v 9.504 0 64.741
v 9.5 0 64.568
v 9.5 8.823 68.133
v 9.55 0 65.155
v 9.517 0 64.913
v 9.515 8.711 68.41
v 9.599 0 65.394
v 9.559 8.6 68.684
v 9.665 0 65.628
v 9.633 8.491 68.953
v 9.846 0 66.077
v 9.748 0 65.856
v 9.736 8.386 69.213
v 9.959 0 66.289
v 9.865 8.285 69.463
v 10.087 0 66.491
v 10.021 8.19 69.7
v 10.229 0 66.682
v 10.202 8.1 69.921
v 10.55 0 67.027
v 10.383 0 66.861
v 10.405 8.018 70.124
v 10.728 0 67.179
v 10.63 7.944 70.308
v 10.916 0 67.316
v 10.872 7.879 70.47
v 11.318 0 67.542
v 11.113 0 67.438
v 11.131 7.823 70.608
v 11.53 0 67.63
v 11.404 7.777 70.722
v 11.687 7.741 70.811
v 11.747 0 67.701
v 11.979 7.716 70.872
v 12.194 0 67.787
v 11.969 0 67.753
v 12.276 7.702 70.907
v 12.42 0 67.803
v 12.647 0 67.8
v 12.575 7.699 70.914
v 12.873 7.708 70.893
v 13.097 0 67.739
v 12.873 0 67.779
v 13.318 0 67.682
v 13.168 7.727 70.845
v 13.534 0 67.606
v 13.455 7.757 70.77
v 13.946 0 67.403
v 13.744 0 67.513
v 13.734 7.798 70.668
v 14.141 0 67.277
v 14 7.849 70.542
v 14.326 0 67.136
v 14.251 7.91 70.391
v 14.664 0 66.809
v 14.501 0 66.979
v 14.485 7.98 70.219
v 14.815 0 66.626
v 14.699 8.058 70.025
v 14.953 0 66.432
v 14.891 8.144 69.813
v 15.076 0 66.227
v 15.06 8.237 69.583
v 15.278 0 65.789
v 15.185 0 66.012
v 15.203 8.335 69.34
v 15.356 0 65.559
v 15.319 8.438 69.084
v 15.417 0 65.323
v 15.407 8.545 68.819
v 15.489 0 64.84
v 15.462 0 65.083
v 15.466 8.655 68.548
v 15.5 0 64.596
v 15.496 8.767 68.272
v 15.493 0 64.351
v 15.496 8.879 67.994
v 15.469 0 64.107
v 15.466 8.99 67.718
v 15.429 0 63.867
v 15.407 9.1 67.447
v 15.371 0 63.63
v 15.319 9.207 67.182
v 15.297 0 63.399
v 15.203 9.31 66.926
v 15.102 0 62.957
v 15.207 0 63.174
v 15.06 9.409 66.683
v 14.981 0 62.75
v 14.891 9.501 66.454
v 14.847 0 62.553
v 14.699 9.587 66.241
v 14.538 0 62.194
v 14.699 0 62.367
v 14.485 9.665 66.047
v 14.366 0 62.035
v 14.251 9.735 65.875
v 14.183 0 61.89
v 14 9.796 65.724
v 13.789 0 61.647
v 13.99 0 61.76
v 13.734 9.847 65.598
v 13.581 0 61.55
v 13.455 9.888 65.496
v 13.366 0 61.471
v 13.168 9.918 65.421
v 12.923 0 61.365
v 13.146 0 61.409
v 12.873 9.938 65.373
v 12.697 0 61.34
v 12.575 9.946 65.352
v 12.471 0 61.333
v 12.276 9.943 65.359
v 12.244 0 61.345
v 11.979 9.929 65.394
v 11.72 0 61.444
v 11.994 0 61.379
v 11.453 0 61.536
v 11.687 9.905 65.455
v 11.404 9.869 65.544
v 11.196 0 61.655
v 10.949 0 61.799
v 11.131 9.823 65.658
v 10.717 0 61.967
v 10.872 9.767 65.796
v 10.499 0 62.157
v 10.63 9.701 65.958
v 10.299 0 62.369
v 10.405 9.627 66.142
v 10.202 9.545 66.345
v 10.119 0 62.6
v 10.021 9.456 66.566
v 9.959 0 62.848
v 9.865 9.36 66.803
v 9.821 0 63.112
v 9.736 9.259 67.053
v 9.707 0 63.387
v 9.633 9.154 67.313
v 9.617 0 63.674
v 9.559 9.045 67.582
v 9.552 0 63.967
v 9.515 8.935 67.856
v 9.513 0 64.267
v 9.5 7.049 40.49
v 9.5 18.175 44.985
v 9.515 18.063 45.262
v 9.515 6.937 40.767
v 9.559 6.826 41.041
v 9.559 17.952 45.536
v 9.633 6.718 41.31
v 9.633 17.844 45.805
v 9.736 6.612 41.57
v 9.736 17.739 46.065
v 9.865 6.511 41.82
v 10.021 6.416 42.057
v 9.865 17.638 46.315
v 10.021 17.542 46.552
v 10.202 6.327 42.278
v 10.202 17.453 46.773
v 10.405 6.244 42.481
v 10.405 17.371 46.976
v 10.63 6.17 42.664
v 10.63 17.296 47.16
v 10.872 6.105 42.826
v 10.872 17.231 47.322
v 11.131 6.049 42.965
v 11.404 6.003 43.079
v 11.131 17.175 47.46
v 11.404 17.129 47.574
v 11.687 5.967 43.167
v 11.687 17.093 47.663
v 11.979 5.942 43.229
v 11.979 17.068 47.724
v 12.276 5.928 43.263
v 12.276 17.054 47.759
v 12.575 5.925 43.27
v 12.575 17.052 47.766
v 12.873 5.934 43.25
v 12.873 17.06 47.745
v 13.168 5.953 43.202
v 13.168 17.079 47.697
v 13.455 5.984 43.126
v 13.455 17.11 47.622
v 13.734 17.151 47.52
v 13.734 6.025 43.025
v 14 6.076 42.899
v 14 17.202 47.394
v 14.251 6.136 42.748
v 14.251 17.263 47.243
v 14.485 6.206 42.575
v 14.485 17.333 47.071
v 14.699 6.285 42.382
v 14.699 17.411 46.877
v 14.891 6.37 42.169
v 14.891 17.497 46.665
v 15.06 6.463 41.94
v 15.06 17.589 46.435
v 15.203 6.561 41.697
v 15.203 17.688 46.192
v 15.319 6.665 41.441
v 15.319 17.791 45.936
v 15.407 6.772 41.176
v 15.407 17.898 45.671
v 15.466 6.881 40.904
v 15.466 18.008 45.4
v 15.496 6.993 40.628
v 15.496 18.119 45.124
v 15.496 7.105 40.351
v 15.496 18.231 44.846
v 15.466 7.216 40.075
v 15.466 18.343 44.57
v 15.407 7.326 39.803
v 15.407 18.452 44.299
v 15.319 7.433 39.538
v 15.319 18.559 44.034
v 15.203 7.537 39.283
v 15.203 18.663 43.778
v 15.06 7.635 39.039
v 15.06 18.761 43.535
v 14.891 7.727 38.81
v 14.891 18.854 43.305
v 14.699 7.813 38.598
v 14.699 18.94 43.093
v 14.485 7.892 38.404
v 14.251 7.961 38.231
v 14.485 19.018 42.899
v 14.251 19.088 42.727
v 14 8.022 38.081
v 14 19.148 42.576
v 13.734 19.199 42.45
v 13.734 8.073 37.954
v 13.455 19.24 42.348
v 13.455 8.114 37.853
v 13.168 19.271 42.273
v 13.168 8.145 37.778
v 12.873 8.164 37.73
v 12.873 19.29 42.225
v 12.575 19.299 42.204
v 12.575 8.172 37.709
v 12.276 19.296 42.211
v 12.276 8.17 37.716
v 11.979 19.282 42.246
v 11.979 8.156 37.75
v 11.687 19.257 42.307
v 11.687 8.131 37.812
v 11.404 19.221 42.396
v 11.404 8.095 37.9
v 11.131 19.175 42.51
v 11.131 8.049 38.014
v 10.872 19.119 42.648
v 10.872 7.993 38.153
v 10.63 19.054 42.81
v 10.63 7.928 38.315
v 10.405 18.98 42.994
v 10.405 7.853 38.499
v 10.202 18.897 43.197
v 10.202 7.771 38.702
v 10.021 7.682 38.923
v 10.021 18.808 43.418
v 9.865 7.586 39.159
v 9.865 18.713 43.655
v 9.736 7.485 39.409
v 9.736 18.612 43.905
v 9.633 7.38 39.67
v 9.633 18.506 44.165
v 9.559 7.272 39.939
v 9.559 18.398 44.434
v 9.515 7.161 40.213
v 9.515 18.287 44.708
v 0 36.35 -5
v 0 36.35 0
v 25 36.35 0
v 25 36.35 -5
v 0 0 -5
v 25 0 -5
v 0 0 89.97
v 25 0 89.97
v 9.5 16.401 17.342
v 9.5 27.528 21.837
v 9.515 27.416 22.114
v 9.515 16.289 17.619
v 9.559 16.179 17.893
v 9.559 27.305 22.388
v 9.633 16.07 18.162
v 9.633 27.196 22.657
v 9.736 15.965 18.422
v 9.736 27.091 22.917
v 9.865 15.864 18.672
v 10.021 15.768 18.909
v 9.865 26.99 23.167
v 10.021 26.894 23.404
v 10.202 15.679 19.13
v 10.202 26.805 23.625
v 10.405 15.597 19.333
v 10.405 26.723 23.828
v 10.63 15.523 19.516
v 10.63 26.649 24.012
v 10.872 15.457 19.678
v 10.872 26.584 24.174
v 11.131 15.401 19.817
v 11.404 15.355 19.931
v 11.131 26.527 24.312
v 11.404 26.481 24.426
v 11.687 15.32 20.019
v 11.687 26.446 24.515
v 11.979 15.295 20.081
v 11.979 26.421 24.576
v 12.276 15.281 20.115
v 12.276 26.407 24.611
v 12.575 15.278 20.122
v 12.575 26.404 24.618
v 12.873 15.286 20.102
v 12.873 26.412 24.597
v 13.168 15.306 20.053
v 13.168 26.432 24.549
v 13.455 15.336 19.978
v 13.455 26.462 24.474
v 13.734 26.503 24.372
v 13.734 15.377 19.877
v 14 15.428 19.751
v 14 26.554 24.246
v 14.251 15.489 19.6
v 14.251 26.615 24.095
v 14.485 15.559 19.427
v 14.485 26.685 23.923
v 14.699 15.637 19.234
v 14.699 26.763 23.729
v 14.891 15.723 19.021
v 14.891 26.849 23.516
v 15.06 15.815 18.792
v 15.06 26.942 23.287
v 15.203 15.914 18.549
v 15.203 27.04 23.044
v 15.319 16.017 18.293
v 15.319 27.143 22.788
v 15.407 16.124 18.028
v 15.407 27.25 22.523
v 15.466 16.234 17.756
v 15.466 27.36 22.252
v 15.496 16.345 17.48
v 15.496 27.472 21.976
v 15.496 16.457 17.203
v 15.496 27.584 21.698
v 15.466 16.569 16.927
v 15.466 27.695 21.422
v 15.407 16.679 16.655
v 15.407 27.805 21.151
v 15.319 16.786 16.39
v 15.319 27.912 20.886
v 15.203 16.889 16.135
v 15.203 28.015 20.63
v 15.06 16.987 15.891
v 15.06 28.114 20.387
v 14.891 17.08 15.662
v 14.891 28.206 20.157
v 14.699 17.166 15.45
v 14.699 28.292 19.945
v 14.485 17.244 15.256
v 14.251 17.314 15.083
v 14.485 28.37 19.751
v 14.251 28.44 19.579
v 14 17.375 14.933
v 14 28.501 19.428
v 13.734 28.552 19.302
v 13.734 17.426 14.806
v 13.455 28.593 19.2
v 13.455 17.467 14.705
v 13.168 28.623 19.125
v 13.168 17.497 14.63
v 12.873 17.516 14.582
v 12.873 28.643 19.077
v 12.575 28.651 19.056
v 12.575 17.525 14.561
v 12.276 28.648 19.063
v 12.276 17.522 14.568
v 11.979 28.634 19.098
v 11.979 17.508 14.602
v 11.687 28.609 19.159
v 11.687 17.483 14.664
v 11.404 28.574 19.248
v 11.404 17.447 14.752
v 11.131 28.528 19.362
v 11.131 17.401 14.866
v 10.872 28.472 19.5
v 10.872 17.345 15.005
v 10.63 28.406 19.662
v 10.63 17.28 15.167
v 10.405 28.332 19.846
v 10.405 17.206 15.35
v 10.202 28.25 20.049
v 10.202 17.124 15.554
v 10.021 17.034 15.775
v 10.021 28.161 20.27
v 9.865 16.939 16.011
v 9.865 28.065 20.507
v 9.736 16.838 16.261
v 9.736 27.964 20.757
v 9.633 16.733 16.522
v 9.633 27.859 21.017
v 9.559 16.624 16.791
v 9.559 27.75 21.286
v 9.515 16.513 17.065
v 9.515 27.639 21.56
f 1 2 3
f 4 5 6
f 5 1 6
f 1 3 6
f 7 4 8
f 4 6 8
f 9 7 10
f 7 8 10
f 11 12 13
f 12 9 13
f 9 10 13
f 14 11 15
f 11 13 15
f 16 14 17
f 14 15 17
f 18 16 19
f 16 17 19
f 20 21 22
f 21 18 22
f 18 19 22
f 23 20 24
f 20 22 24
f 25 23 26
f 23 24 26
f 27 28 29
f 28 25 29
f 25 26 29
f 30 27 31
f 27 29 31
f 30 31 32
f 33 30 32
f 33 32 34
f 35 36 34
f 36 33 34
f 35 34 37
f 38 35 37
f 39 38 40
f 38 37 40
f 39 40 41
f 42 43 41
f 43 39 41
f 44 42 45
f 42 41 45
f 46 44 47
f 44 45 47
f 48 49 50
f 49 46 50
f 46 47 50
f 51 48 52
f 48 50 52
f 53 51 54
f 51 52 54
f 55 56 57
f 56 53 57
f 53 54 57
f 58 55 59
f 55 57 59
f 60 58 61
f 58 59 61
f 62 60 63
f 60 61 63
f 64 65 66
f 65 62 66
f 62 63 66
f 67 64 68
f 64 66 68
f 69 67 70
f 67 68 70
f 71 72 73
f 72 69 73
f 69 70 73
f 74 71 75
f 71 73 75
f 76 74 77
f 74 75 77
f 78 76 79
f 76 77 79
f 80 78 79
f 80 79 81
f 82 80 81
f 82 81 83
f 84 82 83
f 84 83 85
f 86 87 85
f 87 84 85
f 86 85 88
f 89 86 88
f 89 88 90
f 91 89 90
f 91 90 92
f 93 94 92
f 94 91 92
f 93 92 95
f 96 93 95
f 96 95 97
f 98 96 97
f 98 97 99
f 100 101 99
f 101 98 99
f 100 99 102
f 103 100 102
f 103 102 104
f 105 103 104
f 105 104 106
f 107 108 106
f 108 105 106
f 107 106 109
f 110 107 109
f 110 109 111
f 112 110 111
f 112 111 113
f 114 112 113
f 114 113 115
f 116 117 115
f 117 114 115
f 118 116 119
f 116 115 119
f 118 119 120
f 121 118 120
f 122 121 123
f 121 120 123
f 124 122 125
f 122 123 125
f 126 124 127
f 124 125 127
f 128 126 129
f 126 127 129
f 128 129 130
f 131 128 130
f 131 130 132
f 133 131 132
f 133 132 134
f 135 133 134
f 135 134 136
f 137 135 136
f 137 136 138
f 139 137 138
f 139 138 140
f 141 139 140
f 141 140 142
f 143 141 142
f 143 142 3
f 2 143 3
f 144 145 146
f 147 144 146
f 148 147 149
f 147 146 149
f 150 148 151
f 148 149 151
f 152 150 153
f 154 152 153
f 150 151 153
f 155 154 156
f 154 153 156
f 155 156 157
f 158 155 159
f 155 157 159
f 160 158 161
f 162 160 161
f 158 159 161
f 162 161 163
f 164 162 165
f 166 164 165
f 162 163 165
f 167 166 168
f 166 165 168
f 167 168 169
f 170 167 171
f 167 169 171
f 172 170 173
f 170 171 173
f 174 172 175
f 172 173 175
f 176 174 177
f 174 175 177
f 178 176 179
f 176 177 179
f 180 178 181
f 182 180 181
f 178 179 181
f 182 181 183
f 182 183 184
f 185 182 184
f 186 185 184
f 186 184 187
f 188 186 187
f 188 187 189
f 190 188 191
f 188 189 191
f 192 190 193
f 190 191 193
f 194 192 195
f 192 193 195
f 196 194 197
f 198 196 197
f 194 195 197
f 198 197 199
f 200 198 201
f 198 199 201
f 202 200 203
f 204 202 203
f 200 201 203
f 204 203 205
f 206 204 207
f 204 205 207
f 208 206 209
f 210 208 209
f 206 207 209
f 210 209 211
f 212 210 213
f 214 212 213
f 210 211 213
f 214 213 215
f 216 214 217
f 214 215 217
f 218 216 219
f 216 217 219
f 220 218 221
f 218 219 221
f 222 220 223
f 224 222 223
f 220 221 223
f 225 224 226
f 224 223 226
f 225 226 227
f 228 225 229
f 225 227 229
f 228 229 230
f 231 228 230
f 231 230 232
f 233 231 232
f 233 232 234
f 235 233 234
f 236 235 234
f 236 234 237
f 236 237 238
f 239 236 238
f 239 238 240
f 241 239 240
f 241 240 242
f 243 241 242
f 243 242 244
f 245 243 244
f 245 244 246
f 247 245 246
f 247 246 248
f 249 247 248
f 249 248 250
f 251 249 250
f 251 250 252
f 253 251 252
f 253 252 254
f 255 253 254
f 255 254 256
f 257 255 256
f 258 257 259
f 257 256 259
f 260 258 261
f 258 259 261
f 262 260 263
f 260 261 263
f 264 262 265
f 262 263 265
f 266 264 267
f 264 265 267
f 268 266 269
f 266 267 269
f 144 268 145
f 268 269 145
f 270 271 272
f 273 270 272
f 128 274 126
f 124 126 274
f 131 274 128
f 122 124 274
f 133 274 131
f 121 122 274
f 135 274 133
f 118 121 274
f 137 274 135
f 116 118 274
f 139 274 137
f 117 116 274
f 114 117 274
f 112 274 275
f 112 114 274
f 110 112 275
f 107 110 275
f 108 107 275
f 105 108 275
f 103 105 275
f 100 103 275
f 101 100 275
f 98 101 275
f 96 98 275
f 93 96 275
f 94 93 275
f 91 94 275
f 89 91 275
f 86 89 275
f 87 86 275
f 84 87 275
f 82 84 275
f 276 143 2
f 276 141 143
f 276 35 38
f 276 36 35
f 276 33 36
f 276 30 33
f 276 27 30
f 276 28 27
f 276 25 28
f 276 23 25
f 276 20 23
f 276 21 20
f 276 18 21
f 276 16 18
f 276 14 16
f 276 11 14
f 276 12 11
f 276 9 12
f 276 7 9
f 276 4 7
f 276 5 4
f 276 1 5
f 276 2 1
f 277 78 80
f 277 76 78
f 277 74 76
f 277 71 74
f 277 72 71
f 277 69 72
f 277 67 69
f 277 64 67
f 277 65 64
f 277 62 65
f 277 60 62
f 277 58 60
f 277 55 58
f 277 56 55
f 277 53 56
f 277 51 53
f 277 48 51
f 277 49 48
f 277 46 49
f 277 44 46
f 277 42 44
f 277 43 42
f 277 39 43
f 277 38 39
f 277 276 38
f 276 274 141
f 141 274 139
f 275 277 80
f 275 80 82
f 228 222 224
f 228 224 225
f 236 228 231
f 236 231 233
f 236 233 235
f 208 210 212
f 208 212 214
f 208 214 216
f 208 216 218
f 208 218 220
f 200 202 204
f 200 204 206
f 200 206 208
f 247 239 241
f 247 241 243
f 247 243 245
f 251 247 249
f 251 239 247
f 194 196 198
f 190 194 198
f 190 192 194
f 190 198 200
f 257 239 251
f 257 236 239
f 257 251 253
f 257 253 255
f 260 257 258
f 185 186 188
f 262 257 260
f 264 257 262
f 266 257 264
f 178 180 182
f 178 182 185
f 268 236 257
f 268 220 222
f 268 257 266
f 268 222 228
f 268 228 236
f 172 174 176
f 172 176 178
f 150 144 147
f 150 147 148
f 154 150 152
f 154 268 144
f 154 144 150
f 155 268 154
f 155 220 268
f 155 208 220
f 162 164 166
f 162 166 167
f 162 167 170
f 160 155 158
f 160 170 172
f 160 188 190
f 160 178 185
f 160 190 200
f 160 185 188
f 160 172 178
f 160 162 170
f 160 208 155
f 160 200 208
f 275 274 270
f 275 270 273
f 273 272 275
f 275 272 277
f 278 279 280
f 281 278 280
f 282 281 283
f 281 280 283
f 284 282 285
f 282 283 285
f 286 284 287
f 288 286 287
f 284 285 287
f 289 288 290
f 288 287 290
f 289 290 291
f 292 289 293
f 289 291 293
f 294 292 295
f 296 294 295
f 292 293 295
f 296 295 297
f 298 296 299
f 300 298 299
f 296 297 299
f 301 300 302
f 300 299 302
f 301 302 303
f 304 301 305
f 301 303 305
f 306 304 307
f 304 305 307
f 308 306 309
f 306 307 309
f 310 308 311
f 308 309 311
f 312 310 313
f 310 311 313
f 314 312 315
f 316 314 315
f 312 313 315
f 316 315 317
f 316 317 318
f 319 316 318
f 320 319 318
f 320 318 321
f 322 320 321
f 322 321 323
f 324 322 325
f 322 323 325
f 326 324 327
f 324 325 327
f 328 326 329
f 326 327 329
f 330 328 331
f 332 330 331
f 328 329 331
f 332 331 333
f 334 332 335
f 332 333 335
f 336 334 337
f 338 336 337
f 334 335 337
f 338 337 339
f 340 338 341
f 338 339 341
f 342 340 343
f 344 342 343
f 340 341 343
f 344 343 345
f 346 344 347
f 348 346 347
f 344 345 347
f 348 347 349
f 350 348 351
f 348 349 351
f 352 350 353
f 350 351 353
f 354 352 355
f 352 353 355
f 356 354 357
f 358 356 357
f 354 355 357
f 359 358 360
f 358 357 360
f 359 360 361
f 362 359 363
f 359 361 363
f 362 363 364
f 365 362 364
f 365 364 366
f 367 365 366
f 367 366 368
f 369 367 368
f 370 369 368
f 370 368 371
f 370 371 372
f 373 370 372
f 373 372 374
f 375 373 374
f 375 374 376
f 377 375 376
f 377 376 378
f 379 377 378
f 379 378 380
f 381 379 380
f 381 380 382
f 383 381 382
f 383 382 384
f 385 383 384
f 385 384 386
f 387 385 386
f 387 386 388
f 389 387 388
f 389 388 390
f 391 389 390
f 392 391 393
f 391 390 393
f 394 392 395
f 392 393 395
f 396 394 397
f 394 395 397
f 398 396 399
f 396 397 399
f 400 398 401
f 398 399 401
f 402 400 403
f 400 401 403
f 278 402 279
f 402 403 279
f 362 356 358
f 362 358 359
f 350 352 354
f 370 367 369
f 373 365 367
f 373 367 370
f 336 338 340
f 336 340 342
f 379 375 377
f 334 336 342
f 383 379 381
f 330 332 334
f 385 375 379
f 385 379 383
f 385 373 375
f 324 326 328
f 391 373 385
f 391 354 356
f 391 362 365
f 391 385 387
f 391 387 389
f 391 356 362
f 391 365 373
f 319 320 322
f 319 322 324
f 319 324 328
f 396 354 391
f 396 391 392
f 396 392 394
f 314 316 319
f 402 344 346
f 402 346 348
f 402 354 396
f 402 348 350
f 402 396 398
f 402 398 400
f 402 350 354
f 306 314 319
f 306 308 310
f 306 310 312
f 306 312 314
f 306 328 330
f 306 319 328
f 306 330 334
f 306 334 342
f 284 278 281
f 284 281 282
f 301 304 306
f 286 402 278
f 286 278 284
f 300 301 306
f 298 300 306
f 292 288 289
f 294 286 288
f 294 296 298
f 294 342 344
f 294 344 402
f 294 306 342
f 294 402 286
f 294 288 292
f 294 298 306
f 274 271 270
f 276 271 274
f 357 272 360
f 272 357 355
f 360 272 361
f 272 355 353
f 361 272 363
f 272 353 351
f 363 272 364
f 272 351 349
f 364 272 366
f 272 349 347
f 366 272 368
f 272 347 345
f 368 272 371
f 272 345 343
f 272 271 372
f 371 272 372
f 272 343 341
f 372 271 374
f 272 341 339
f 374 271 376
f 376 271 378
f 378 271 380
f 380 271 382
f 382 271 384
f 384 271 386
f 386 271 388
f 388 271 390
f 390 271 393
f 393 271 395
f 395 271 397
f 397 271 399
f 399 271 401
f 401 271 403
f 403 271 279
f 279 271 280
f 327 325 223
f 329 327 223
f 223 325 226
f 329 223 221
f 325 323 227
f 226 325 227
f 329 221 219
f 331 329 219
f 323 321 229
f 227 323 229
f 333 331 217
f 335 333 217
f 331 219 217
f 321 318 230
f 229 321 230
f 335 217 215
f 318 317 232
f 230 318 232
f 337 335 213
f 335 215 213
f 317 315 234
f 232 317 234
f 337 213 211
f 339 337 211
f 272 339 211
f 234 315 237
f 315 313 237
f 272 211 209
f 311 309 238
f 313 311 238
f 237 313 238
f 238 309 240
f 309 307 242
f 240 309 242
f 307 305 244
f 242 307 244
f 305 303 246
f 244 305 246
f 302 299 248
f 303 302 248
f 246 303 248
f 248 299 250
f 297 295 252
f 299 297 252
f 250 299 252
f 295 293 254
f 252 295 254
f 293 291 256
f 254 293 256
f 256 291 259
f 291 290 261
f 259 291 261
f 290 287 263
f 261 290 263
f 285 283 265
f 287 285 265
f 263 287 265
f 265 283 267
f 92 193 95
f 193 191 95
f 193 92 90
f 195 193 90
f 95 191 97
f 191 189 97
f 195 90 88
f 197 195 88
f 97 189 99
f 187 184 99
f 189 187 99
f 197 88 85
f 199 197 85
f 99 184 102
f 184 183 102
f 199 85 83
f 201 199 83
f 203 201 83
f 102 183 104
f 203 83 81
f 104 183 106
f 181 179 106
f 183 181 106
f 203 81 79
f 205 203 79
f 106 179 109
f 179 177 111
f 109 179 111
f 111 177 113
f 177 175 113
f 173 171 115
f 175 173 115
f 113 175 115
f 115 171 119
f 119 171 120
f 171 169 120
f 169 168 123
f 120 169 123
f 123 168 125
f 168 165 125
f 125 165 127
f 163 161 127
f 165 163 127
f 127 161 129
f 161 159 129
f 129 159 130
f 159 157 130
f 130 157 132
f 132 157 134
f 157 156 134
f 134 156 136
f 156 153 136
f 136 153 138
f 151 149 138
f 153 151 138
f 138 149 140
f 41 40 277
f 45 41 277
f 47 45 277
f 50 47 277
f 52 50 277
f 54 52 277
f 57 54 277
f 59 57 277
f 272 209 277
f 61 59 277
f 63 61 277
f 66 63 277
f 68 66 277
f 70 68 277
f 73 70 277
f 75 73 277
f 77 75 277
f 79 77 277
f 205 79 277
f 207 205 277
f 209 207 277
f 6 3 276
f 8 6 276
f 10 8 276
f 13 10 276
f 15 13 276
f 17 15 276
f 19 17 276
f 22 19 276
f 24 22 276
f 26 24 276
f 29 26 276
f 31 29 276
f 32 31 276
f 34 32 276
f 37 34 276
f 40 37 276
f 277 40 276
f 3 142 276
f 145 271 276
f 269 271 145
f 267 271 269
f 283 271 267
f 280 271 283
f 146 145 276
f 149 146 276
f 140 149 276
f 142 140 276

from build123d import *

# Parameters (mm, degrees)
F1_DEPTH = 25
F2_W     = 25
F2_H     = 36.3502395384
F3_DEPTH = 5
F4_R     = 3
F5_DEPTH = 12


with BuildPart() as f1:
    # F0 (on Right) → F1 (new body)
    with BuildSketch(Plane.YZ):
        Polygon((0, 89.97), (0, 0), (36.3502395384, 0), align=None)
    extrude(amount=F1_DEPTH)

    # F2 (on face) → F3 (join)
    with BuildSketch(Plane(origin=(0, 0, 0), x_dir=(1, 0, 0), z_dir=(0, 0, -1))):
        with Locations((12.5, -18.1751197692)):
            Rectangle(F2_W, F2_H)
    extrude(amount=F3_DEPTH)

    # F4 (on face) → F5 (cut)
    with BuildSketch(Plane(origin=(0, 31.2492067951, 12.6254990818), x_dir=(-1, 0, 0), z_dir=(0, 0.9271838546, 0.3746065934))):
        with Locations((-12.5, 34.900845996)):
            Circle(F4_R)
        with Locations((-12.5, 59.8668195307)):
            Circle(F4_R)
        with Locations((-12.5, 9.9348724613)):
            Circle(F4_R)
    extrude(amount=-F5_DEPTH, mode=Mode.SUBTRACT)


solid = f1.part
